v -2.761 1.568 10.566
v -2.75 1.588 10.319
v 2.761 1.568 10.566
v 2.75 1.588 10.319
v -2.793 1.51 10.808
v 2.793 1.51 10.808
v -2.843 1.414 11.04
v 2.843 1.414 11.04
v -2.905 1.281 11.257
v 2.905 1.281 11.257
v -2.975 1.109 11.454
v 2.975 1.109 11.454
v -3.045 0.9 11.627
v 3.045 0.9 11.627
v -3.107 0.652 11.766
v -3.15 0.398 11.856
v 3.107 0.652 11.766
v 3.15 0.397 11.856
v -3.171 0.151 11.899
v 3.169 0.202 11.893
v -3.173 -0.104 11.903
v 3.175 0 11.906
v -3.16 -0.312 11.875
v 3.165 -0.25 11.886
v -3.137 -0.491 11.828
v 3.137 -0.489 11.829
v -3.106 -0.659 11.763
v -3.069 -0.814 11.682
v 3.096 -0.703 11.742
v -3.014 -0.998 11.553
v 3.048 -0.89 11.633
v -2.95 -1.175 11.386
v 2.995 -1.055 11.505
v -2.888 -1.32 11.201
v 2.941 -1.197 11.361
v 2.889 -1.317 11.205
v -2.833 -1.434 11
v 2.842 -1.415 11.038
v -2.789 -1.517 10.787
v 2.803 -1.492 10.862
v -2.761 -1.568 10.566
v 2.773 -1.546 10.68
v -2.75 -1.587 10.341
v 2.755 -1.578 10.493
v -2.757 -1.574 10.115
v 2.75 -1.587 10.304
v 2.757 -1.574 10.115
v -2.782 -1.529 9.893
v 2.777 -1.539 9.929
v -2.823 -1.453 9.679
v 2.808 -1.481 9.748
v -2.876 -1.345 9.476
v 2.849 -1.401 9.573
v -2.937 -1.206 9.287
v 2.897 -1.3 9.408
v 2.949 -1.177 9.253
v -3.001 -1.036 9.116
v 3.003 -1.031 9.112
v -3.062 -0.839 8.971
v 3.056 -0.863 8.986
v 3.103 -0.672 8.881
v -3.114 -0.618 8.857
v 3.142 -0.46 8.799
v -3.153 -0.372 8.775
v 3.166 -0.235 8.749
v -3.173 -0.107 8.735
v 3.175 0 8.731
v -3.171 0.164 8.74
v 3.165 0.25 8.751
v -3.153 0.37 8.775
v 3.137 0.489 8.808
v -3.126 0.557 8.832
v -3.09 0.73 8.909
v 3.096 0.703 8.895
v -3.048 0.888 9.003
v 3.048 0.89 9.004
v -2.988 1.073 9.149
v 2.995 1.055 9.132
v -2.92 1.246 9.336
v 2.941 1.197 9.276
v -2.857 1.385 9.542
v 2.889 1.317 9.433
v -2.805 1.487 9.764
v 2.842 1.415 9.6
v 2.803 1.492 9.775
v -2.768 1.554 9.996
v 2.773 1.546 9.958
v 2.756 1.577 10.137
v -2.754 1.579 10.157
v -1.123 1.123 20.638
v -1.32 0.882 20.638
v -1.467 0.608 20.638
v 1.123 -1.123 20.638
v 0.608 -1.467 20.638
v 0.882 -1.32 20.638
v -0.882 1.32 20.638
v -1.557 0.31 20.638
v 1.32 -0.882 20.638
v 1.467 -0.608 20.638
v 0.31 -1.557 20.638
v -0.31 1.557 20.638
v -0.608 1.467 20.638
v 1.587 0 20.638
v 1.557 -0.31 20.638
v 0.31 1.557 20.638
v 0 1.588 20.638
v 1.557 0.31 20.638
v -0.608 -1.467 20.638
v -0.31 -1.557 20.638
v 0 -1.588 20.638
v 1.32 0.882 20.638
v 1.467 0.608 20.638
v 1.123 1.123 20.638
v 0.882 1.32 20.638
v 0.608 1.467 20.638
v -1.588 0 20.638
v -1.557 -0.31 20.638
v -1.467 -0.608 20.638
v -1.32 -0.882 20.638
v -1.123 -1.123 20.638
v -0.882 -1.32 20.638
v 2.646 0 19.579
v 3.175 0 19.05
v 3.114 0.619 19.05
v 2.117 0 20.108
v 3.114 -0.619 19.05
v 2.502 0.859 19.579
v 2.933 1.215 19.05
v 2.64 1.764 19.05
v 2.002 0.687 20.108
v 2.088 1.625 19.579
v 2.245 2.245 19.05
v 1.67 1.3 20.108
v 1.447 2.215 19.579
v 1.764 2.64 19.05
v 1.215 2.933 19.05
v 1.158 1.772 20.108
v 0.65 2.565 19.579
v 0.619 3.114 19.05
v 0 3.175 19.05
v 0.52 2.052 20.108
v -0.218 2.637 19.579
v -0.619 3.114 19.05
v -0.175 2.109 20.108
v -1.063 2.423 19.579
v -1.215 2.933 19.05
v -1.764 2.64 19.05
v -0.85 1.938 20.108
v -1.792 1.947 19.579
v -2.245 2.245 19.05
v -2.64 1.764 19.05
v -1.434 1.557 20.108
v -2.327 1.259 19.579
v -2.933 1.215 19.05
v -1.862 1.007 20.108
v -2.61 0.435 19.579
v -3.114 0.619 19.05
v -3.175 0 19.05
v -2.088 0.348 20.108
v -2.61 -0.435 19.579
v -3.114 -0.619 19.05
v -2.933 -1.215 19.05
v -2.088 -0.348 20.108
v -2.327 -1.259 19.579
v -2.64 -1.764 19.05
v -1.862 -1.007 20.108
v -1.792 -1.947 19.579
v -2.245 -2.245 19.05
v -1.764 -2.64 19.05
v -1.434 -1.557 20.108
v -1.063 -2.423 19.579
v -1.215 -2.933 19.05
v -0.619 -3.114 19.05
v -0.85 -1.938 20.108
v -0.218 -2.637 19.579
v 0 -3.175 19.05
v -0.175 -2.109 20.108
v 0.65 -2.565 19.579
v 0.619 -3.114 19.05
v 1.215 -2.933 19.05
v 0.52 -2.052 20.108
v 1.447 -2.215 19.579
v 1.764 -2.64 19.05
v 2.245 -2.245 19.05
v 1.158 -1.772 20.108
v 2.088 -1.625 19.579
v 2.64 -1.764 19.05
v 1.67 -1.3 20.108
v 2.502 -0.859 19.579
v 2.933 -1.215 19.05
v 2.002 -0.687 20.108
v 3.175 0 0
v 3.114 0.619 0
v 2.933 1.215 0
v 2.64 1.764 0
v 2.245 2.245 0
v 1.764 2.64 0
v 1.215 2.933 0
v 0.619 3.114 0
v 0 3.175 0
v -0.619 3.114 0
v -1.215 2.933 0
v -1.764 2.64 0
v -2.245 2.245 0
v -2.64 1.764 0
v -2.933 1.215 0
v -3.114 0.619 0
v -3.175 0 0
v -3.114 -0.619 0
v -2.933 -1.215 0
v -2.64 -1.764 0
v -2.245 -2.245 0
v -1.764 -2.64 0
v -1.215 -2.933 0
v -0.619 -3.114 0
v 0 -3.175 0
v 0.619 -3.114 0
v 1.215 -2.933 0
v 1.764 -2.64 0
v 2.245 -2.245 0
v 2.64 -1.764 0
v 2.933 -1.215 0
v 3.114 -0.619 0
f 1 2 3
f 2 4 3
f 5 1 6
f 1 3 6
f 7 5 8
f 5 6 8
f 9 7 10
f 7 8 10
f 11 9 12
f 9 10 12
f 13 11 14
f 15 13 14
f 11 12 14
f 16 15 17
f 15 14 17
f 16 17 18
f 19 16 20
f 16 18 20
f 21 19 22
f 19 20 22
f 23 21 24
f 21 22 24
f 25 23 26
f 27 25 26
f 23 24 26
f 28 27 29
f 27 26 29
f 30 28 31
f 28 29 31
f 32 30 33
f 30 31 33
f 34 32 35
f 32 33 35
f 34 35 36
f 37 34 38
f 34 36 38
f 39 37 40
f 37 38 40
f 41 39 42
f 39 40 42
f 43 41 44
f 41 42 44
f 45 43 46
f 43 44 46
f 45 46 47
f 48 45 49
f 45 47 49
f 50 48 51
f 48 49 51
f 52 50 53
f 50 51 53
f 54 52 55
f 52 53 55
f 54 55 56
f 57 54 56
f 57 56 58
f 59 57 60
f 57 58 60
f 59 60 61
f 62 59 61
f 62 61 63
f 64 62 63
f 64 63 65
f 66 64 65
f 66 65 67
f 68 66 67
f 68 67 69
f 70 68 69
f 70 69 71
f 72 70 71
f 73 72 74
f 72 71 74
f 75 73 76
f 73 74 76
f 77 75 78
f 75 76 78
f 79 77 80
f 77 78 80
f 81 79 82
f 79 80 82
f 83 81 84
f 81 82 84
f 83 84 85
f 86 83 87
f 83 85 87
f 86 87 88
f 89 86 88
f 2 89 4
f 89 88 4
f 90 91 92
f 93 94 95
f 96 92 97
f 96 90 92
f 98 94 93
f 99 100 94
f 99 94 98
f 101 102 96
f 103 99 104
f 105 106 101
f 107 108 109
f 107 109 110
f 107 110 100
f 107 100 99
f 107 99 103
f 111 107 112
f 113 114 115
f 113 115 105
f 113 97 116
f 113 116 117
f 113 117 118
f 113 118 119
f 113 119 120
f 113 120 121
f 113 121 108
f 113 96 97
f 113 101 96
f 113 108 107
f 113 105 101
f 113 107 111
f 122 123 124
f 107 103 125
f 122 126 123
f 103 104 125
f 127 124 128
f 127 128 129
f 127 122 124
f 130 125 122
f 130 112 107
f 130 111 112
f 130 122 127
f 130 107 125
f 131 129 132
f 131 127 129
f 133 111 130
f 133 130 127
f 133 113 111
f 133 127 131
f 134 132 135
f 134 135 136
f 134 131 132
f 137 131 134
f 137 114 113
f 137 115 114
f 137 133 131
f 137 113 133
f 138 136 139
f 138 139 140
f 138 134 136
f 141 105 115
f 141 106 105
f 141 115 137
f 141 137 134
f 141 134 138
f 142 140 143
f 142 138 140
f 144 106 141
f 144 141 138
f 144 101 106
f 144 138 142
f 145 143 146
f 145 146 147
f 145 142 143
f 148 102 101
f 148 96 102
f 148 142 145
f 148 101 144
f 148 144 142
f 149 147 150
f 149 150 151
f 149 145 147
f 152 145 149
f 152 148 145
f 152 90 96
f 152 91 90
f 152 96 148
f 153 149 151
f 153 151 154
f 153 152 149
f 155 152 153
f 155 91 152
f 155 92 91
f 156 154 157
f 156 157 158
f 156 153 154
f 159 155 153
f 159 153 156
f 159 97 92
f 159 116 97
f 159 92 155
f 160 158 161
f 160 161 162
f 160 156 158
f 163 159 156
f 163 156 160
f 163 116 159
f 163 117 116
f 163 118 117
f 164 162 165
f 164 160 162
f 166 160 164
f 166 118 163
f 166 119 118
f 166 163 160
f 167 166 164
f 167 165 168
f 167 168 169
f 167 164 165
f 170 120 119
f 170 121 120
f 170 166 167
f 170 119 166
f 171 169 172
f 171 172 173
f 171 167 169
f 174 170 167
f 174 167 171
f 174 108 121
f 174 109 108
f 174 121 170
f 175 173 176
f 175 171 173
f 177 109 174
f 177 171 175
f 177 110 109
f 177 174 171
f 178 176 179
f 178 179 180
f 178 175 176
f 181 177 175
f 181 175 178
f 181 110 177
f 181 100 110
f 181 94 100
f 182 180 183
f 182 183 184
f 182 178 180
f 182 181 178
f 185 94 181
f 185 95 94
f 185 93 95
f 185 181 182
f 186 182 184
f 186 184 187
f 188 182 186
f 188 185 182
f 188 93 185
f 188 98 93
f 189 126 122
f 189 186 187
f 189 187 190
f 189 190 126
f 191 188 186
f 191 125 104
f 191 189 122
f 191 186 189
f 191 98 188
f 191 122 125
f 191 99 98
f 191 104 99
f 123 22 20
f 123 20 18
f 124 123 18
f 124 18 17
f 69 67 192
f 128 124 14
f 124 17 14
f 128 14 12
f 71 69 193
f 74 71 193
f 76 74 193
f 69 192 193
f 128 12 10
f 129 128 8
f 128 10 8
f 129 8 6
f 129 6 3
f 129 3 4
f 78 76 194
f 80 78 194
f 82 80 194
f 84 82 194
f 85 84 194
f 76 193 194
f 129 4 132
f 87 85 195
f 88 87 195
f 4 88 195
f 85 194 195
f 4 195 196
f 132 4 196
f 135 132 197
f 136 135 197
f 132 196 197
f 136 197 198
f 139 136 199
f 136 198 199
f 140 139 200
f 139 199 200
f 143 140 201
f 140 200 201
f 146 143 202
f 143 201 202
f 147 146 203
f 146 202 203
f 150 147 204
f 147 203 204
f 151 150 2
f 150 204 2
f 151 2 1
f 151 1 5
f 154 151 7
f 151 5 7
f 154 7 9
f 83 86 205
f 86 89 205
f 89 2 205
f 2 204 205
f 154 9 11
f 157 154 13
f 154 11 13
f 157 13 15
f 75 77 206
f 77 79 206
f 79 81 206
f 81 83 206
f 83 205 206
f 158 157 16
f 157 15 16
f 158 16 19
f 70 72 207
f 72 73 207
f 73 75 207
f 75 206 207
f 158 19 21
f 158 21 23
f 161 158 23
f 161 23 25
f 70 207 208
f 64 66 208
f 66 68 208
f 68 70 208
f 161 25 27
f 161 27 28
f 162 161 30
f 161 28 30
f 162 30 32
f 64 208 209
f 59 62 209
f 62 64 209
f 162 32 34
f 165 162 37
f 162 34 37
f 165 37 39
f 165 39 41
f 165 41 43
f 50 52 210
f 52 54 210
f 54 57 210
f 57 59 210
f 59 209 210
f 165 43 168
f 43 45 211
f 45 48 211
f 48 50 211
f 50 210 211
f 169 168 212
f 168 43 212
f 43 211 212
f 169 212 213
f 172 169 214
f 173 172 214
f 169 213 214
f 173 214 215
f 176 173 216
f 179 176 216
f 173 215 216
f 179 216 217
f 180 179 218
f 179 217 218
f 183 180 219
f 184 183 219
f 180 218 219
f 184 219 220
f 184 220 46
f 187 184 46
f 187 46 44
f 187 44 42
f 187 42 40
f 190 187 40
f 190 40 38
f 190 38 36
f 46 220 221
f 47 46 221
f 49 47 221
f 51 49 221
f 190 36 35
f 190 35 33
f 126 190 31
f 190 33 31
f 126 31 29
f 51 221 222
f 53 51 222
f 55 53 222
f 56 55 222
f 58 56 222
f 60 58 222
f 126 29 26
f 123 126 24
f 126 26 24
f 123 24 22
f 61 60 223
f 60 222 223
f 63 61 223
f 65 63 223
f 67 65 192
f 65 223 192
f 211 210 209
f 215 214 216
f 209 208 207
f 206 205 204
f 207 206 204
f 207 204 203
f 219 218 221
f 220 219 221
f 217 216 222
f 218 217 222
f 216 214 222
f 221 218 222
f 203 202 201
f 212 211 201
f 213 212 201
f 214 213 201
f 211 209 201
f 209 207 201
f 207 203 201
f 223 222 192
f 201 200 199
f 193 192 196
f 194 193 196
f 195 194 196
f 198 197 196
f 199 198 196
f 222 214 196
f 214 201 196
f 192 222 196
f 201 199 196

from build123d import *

# Parameters (mm, degrees)
F0_R     = 3.175
F1_DEPTH = 20.6375
F2_SIZE  = 1.5875
F3_R     = 1.5875
F4_DEPTH = 12.7


with BuildPart() as f1:
    # F0 (on Top) → F1 (new body)
    with BuildSketch(Plane.XY):
        Circle(F0_R)
    extrude(amount=F1_DEPTH)

    # F2
    f2_edges = [f1.edges().sort_by_distance(p)[0] for p in [
        (-3.175, 0, 20.6375),
    ]]
    chamfer(f2_edges, length=F2_SIZE)

    # F3 (on Right) → F4 (cut, symmetric)
    with BuildSketch(Plane.YZ):
        with Locations((0, 10.31875)):
            Circle(F3_R)
    extrude(amount=F4_DEPTH, both=True, mode=Mode.SUBTRACT)


solid = f1.part
